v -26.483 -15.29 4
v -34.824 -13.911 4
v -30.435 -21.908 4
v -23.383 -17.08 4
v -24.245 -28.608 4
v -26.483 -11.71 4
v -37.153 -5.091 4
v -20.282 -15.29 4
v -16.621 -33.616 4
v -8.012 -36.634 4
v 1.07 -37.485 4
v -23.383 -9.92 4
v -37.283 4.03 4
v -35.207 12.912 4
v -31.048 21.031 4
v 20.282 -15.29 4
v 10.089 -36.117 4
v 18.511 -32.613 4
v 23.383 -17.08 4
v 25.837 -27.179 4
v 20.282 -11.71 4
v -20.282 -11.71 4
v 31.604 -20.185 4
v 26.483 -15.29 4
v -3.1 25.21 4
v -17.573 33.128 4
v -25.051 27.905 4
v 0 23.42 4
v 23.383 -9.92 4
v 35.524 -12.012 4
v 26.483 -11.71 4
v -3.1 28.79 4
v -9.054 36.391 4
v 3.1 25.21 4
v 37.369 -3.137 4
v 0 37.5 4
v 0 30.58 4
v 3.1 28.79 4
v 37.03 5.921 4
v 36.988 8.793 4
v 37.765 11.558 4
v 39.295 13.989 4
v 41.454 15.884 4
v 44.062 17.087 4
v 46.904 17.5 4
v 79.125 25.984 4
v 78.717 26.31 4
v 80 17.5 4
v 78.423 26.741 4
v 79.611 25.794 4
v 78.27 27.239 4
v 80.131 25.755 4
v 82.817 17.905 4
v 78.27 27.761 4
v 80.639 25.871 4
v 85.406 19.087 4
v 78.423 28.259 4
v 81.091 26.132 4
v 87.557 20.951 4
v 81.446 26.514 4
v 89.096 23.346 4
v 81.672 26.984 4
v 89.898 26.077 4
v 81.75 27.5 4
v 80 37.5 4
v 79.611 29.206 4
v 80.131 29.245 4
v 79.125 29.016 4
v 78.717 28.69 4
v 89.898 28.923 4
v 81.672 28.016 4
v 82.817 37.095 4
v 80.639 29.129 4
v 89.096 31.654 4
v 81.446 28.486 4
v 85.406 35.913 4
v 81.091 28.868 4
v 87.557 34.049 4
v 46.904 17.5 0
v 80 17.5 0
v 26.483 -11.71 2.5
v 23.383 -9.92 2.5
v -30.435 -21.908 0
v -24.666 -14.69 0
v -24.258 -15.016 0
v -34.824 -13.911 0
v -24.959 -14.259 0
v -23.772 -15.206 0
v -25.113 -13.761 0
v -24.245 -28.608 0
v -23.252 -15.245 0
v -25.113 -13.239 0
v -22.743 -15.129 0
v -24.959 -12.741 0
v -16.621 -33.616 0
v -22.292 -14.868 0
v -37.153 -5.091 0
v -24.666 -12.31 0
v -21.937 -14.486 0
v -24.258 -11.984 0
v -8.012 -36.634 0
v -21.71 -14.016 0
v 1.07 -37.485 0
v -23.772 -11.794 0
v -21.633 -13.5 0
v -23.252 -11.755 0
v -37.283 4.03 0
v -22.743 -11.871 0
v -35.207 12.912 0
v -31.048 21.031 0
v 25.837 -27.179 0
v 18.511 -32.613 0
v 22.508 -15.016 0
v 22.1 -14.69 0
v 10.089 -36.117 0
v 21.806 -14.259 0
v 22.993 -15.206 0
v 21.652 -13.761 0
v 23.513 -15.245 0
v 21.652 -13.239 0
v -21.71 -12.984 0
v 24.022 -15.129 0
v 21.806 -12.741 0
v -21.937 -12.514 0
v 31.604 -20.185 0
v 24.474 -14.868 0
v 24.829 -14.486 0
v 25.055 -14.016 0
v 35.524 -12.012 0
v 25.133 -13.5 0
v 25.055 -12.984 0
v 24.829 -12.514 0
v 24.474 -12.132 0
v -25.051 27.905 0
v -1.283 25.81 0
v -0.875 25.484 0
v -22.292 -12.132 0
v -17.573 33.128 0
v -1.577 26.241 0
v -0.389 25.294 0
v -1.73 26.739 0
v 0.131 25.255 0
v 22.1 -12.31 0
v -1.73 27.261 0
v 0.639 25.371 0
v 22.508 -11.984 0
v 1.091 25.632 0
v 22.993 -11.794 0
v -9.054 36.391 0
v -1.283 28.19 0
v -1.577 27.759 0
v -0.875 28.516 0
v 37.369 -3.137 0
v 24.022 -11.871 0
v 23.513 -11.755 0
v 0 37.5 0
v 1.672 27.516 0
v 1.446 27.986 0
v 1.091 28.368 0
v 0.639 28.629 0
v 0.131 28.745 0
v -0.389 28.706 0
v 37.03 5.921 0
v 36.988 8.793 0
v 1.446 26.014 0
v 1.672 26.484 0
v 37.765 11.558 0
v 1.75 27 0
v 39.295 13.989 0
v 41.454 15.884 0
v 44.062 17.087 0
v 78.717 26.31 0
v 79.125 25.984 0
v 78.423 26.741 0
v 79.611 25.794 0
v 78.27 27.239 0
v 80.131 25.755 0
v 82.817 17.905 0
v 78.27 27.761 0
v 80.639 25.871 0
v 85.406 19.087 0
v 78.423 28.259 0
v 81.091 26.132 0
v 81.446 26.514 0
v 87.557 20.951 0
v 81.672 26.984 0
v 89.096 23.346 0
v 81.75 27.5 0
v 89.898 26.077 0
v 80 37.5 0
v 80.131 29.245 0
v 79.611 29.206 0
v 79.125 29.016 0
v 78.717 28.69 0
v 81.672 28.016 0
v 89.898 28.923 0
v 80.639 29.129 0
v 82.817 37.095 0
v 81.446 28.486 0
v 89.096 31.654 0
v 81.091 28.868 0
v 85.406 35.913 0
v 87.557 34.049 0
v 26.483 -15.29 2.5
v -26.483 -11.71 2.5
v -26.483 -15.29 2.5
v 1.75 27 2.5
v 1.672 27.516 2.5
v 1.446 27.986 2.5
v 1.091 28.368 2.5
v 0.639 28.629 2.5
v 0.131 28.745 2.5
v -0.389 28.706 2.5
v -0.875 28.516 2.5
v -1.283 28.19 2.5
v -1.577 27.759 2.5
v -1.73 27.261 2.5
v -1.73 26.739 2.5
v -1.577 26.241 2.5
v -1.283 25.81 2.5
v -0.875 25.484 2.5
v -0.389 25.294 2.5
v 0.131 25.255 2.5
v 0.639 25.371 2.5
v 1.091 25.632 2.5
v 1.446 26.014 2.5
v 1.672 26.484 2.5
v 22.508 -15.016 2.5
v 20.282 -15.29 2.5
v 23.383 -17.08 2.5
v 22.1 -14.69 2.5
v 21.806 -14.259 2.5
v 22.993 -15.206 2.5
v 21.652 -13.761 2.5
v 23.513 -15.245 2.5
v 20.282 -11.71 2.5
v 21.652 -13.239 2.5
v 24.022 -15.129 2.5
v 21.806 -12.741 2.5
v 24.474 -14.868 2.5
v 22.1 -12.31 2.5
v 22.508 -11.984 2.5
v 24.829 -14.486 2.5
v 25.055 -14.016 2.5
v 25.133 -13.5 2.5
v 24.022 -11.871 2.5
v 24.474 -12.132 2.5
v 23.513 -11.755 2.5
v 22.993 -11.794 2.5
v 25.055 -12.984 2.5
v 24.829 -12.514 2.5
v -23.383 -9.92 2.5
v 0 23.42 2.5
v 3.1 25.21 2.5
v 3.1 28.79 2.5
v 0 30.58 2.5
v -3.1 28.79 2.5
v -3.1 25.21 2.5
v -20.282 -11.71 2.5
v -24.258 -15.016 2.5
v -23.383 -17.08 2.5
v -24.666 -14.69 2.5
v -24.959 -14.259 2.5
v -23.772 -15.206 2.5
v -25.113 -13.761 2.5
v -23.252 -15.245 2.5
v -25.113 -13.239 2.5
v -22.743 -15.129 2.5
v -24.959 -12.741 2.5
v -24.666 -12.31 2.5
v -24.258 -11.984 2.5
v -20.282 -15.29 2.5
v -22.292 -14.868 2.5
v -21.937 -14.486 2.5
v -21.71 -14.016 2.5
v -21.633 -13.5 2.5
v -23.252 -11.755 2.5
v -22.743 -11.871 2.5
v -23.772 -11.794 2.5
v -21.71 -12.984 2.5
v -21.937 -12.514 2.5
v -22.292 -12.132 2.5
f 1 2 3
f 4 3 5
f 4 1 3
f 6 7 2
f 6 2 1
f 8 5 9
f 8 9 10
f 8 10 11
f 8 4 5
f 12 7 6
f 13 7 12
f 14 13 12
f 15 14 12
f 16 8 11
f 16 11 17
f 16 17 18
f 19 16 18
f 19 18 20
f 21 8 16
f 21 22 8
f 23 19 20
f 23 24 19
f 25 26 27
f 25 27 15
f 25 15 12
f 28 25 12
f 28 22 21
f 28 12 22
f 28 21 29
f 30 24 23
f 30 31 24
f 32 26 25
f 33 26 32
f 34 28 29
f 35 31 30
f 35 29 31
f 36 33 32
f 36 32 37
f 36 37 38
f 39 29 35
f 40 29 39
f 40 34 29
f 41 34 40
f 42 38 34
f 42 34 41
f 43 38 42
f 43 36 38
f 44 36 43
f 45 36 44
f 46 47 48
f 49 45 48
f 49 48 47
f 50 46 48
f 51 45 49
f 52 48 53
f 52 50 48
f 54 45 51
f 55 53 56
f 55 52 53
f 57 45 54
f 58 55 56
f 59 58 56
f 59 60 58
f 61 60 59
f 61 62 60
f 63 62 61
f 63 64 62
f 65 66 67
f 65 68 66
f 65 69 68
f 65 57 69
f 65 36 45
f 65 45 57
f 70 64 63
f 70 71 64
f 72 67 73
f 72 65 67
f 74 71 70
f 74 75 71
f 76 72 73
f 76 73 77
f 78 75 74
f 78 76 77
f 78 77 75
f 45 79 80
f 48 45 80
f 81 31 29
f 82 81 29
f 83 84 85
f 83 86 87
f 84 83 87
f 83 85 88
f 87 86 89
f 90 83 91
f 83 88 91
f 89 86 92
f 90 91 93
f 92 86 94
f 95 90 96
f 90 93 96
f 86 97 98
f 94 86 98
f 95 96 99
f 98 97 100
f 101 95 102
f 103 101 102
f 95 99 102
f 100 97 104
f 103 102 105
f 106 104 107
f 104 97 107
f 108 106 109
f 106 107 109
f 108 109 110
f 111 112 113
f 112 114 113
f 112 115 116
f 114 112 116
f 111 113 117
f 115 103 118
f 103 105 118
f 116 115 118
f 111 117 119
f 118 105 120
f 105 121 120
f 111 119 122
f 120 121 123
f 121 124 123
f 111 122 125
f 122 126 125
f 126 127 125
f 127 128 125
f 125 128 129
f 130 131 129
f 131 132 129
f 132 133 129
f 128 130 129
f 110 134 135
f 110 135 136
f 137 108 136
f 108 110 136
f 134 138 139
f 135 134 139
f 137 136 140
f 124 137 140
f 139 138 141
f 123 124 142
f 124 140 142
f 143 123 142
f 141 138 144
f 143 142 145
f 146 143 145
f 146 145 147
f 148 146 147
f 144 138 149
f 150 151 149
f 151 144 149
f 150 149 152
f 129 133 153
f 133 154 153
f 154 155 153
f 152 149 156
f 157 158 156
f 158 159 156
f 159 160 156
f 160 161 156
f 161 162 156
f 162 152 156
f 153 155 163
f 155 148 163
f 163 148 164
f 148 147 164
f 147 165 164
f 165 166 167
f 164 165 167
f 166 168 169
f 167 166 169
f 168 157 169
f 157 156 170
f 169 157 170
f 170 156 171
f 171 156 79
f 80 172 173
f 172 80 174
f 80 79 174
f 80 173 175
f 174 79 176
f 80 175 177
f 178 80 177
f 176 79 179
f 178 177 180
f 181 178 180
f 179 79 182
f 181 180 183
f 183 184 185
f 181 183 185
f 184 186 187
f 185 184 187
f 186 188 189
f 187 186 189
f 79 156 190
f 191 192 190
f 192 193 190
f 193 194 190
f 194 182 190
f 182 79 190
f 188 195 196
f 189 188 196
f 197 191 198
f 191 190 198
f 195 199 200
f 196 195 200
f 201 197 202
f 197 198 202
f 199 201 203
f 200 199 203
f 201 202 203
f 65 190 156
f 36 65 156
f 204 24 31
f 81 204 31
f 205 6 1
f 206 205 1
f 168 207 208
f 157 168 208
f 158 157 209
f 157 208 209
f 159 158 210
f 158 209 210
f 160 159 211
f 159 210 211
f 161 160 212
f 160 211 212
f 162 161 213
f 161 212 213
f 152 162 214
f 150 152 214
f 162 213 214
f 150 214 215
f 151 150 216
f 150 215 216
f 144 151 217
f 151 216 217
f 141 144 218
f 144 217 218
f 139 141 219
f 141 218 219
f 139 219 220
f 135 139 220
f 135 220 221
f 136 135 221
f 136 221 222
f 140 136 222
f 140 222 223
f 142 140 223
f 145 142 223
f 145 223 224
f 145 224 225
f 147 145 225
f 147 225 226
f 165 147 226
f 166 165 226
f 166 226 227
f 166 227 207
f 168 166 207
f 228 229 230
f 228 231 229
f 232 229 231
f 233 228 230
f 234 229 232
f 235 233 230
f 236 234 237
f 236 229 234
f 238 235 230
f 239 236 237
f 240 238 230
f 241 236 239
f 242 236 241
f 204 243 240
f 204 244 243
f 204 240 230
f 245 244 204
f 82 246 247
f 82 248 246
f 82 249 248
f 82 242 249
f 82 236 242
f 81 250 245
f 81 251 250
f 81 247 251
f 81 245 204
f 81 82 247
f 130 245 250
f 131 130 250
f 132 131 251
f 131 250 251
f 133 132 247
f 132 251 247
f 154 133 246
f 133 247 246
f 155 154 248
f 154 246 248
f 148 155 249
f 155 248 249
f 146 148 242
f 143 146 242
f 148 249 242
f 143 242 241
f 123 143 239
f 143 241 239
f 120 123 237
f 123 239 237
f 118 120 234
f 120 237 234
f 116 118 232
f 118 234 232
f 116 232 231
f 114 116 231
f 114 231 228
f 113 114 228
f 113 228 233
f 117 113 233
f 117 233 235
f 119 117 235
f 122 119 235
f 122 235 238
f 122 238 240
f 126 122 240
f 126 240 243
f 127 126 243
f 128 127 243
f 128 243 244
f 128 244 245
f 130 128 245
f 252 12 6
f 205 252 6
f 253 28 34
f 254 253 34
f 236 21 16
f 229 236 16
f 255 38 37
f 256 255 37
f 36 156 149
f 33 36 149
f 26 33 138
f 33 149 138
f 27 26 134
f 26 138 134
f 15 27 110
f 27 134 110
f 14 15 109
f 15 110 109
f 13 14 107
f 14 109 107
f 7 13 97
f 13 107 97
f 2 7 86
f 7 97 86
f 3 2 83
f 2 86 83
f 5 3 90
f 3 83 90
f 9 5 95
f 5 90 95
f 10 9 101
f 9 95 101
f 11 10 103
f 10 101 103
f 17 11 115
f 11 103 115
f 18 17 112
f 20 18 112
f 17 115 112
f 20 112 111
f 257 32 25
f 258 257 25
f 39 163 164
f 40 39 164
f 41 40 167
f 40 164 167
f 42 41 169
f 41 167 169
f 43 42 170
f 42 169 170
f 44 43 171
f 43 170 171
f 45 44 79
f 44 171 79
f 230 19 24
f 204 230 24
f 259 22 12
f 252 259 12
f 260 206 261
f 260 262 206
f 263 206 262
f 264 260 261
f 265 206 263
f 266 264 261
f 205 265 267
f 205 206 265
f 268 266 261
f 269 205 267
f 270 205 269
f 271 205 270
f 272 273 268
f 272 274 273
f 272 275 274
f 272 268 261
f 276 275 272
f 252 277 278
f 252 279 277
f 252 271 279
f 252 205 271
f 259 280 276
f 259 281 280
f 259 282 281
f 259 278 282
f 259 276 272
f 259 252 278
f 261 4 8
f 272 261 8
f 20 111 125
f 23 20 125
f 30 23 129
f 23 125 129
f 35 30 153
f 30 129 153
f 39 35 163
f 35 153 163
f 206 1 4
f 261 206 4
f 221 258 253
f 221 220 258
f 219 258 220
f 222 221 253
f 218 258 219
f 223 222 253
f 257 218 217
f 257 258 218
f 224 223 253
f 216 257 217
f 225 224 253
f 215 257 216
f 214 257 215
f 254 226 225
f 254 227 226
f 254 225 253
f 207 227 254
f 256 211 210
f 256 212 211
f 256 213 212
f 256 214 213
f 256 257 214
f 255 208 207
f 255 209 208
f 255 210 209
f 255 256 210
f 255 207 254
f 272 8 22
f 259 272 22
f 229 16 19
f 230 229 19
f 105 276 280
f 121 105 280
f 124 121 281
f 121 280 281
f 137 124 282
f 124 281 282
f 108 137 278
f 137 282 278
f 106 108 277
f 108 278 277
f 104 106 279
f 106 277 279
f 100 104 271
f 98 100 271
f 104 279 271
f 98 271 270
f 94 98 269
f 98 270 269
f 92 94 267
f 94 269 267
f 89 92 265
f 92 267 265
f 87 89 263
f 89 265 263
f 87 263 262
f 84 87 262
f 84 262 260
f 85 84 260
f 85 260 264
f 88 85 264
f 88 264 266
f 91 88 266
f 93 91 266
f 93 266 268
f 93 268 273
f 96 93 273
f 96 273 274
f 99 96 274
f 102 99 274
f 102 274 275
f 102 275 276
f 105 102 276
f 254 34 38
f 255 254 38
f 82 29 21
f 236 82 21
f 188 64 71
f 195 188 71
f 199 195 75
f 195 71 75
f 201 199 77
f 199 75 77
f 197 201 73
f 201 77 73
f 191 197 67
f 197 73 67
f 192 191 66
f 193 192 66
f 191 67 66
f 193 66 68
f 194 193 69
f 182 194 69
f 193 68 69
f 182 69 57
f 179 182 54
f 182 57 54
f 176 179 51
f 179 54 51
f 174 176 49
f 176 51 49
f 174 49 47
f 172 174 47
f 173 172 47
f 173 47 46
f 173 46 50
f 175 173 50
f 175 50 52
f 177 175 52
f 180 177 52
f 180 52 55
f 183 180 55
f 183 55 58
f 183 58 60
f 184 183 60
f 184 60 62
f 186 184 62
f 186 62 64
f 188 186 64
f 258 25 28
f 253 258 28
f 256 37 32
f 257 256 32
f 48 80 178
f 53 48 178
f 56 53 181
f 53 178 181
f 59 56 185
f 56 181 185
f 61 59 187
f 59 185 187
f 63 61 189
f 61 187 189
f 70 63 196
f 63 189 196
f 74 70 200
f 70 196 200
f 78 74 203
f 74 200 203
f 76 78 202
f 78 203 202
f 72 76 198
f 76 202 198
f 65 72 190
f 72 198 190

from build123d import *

# Parameters (mm, degrees)
BOSS_EXTRUDE1_DEPTH = 4
CUT_EXTRUDE1_DEPTH  = 1.5
SKETCH4_R           = 1.75
CUT_EXTRUDE3_DEPTH  = 17.5
SKETCH5_R           = 1.75
CUT_EXTRUDE4_DEPTH  = 17.5


with BuildPart() as part:
    # Sketch2 → Boss-Extrude1 (new body)
    with BuildSketch(Plane.XY):
        with BuildLine():
            Line((80, 37.5), (0, 37.5))
            ThreePointArc((0, 37.5), (-34.824248161, -13.911209149), (25.837194647, -27.178840534))
            ThreePointArc((25.837194647, -27.178840534), (35.524064233, -12.01211307), (37.029598104, 5.921052632))
            ThreePointArc((37.029598104, 5.921052632), (39.295298496, 13.988856845), (46.904157598, 17.5))
            Line((46.904157598, 17.5), (80, 17.5))
            ThreePointArc((80, 17.5), (90, 27.5), (80, 37.5))
        make_face()
    extrude(amount=BOSS_EXTRUDE1_DEPTH)

    # Sketch3 → Cut-Extrude1 (cut)
    with BuildSketch(Plane.XY.offset(4)):
        Polygon((26.483056848, -15.29), (26.483056848, -11.71), (23.382685902, -9.92), (20.282314957, -11.71), (20.282314957, -15.29), (23.382685902, -17.08), align=None)
        Polygon((0, 30.58), (-3.100370946, 28.79), (-3.100370946, 25.21), (0, 23.42), (3.100370946, 25.21), (3.100370946, 28.79), align=None)
        Polygon((-26.483056848, -15.29), (-23.382685902, -17.08), (-20.282314957, -15.29), (-20.282314957, -11.71), (-23.382685902, -9.92), (-26.483056848, -11.71), align=None)
    extrude(amount=-CUT_EXTRUDE1_DEPTH, mode=Mode.SUBTRACT)

    # Sketch4 → Cut-Extrude3 (cut)
    with BuildSketch(Plane.XY.offset(4)):
        with Locations((0, 27)):
            Circle(SKETCH4_R)
        with Locations((23.382685902, -13.5)):
            Circle(SKETCH4_R)
        with Locations((-23.382685902, -13.5)):
            Circle(SKETCH4_R)
    extrude(amount=-CUT_EXTRUDE3_DEPTH, mode=Mode.SUBTRACT)

    # Sketch5 → Cut-Extrude4 (cut)
    with BuildSketch(Plane.XY.offset(4)):
        with Locations((80, 27.5)):
            Circle(SKETCH5_R)
    extrude(amount=-CUT_EXTRUDE4_DEPTH, mode=Mode.SUBTRACT)


solid = part.part
